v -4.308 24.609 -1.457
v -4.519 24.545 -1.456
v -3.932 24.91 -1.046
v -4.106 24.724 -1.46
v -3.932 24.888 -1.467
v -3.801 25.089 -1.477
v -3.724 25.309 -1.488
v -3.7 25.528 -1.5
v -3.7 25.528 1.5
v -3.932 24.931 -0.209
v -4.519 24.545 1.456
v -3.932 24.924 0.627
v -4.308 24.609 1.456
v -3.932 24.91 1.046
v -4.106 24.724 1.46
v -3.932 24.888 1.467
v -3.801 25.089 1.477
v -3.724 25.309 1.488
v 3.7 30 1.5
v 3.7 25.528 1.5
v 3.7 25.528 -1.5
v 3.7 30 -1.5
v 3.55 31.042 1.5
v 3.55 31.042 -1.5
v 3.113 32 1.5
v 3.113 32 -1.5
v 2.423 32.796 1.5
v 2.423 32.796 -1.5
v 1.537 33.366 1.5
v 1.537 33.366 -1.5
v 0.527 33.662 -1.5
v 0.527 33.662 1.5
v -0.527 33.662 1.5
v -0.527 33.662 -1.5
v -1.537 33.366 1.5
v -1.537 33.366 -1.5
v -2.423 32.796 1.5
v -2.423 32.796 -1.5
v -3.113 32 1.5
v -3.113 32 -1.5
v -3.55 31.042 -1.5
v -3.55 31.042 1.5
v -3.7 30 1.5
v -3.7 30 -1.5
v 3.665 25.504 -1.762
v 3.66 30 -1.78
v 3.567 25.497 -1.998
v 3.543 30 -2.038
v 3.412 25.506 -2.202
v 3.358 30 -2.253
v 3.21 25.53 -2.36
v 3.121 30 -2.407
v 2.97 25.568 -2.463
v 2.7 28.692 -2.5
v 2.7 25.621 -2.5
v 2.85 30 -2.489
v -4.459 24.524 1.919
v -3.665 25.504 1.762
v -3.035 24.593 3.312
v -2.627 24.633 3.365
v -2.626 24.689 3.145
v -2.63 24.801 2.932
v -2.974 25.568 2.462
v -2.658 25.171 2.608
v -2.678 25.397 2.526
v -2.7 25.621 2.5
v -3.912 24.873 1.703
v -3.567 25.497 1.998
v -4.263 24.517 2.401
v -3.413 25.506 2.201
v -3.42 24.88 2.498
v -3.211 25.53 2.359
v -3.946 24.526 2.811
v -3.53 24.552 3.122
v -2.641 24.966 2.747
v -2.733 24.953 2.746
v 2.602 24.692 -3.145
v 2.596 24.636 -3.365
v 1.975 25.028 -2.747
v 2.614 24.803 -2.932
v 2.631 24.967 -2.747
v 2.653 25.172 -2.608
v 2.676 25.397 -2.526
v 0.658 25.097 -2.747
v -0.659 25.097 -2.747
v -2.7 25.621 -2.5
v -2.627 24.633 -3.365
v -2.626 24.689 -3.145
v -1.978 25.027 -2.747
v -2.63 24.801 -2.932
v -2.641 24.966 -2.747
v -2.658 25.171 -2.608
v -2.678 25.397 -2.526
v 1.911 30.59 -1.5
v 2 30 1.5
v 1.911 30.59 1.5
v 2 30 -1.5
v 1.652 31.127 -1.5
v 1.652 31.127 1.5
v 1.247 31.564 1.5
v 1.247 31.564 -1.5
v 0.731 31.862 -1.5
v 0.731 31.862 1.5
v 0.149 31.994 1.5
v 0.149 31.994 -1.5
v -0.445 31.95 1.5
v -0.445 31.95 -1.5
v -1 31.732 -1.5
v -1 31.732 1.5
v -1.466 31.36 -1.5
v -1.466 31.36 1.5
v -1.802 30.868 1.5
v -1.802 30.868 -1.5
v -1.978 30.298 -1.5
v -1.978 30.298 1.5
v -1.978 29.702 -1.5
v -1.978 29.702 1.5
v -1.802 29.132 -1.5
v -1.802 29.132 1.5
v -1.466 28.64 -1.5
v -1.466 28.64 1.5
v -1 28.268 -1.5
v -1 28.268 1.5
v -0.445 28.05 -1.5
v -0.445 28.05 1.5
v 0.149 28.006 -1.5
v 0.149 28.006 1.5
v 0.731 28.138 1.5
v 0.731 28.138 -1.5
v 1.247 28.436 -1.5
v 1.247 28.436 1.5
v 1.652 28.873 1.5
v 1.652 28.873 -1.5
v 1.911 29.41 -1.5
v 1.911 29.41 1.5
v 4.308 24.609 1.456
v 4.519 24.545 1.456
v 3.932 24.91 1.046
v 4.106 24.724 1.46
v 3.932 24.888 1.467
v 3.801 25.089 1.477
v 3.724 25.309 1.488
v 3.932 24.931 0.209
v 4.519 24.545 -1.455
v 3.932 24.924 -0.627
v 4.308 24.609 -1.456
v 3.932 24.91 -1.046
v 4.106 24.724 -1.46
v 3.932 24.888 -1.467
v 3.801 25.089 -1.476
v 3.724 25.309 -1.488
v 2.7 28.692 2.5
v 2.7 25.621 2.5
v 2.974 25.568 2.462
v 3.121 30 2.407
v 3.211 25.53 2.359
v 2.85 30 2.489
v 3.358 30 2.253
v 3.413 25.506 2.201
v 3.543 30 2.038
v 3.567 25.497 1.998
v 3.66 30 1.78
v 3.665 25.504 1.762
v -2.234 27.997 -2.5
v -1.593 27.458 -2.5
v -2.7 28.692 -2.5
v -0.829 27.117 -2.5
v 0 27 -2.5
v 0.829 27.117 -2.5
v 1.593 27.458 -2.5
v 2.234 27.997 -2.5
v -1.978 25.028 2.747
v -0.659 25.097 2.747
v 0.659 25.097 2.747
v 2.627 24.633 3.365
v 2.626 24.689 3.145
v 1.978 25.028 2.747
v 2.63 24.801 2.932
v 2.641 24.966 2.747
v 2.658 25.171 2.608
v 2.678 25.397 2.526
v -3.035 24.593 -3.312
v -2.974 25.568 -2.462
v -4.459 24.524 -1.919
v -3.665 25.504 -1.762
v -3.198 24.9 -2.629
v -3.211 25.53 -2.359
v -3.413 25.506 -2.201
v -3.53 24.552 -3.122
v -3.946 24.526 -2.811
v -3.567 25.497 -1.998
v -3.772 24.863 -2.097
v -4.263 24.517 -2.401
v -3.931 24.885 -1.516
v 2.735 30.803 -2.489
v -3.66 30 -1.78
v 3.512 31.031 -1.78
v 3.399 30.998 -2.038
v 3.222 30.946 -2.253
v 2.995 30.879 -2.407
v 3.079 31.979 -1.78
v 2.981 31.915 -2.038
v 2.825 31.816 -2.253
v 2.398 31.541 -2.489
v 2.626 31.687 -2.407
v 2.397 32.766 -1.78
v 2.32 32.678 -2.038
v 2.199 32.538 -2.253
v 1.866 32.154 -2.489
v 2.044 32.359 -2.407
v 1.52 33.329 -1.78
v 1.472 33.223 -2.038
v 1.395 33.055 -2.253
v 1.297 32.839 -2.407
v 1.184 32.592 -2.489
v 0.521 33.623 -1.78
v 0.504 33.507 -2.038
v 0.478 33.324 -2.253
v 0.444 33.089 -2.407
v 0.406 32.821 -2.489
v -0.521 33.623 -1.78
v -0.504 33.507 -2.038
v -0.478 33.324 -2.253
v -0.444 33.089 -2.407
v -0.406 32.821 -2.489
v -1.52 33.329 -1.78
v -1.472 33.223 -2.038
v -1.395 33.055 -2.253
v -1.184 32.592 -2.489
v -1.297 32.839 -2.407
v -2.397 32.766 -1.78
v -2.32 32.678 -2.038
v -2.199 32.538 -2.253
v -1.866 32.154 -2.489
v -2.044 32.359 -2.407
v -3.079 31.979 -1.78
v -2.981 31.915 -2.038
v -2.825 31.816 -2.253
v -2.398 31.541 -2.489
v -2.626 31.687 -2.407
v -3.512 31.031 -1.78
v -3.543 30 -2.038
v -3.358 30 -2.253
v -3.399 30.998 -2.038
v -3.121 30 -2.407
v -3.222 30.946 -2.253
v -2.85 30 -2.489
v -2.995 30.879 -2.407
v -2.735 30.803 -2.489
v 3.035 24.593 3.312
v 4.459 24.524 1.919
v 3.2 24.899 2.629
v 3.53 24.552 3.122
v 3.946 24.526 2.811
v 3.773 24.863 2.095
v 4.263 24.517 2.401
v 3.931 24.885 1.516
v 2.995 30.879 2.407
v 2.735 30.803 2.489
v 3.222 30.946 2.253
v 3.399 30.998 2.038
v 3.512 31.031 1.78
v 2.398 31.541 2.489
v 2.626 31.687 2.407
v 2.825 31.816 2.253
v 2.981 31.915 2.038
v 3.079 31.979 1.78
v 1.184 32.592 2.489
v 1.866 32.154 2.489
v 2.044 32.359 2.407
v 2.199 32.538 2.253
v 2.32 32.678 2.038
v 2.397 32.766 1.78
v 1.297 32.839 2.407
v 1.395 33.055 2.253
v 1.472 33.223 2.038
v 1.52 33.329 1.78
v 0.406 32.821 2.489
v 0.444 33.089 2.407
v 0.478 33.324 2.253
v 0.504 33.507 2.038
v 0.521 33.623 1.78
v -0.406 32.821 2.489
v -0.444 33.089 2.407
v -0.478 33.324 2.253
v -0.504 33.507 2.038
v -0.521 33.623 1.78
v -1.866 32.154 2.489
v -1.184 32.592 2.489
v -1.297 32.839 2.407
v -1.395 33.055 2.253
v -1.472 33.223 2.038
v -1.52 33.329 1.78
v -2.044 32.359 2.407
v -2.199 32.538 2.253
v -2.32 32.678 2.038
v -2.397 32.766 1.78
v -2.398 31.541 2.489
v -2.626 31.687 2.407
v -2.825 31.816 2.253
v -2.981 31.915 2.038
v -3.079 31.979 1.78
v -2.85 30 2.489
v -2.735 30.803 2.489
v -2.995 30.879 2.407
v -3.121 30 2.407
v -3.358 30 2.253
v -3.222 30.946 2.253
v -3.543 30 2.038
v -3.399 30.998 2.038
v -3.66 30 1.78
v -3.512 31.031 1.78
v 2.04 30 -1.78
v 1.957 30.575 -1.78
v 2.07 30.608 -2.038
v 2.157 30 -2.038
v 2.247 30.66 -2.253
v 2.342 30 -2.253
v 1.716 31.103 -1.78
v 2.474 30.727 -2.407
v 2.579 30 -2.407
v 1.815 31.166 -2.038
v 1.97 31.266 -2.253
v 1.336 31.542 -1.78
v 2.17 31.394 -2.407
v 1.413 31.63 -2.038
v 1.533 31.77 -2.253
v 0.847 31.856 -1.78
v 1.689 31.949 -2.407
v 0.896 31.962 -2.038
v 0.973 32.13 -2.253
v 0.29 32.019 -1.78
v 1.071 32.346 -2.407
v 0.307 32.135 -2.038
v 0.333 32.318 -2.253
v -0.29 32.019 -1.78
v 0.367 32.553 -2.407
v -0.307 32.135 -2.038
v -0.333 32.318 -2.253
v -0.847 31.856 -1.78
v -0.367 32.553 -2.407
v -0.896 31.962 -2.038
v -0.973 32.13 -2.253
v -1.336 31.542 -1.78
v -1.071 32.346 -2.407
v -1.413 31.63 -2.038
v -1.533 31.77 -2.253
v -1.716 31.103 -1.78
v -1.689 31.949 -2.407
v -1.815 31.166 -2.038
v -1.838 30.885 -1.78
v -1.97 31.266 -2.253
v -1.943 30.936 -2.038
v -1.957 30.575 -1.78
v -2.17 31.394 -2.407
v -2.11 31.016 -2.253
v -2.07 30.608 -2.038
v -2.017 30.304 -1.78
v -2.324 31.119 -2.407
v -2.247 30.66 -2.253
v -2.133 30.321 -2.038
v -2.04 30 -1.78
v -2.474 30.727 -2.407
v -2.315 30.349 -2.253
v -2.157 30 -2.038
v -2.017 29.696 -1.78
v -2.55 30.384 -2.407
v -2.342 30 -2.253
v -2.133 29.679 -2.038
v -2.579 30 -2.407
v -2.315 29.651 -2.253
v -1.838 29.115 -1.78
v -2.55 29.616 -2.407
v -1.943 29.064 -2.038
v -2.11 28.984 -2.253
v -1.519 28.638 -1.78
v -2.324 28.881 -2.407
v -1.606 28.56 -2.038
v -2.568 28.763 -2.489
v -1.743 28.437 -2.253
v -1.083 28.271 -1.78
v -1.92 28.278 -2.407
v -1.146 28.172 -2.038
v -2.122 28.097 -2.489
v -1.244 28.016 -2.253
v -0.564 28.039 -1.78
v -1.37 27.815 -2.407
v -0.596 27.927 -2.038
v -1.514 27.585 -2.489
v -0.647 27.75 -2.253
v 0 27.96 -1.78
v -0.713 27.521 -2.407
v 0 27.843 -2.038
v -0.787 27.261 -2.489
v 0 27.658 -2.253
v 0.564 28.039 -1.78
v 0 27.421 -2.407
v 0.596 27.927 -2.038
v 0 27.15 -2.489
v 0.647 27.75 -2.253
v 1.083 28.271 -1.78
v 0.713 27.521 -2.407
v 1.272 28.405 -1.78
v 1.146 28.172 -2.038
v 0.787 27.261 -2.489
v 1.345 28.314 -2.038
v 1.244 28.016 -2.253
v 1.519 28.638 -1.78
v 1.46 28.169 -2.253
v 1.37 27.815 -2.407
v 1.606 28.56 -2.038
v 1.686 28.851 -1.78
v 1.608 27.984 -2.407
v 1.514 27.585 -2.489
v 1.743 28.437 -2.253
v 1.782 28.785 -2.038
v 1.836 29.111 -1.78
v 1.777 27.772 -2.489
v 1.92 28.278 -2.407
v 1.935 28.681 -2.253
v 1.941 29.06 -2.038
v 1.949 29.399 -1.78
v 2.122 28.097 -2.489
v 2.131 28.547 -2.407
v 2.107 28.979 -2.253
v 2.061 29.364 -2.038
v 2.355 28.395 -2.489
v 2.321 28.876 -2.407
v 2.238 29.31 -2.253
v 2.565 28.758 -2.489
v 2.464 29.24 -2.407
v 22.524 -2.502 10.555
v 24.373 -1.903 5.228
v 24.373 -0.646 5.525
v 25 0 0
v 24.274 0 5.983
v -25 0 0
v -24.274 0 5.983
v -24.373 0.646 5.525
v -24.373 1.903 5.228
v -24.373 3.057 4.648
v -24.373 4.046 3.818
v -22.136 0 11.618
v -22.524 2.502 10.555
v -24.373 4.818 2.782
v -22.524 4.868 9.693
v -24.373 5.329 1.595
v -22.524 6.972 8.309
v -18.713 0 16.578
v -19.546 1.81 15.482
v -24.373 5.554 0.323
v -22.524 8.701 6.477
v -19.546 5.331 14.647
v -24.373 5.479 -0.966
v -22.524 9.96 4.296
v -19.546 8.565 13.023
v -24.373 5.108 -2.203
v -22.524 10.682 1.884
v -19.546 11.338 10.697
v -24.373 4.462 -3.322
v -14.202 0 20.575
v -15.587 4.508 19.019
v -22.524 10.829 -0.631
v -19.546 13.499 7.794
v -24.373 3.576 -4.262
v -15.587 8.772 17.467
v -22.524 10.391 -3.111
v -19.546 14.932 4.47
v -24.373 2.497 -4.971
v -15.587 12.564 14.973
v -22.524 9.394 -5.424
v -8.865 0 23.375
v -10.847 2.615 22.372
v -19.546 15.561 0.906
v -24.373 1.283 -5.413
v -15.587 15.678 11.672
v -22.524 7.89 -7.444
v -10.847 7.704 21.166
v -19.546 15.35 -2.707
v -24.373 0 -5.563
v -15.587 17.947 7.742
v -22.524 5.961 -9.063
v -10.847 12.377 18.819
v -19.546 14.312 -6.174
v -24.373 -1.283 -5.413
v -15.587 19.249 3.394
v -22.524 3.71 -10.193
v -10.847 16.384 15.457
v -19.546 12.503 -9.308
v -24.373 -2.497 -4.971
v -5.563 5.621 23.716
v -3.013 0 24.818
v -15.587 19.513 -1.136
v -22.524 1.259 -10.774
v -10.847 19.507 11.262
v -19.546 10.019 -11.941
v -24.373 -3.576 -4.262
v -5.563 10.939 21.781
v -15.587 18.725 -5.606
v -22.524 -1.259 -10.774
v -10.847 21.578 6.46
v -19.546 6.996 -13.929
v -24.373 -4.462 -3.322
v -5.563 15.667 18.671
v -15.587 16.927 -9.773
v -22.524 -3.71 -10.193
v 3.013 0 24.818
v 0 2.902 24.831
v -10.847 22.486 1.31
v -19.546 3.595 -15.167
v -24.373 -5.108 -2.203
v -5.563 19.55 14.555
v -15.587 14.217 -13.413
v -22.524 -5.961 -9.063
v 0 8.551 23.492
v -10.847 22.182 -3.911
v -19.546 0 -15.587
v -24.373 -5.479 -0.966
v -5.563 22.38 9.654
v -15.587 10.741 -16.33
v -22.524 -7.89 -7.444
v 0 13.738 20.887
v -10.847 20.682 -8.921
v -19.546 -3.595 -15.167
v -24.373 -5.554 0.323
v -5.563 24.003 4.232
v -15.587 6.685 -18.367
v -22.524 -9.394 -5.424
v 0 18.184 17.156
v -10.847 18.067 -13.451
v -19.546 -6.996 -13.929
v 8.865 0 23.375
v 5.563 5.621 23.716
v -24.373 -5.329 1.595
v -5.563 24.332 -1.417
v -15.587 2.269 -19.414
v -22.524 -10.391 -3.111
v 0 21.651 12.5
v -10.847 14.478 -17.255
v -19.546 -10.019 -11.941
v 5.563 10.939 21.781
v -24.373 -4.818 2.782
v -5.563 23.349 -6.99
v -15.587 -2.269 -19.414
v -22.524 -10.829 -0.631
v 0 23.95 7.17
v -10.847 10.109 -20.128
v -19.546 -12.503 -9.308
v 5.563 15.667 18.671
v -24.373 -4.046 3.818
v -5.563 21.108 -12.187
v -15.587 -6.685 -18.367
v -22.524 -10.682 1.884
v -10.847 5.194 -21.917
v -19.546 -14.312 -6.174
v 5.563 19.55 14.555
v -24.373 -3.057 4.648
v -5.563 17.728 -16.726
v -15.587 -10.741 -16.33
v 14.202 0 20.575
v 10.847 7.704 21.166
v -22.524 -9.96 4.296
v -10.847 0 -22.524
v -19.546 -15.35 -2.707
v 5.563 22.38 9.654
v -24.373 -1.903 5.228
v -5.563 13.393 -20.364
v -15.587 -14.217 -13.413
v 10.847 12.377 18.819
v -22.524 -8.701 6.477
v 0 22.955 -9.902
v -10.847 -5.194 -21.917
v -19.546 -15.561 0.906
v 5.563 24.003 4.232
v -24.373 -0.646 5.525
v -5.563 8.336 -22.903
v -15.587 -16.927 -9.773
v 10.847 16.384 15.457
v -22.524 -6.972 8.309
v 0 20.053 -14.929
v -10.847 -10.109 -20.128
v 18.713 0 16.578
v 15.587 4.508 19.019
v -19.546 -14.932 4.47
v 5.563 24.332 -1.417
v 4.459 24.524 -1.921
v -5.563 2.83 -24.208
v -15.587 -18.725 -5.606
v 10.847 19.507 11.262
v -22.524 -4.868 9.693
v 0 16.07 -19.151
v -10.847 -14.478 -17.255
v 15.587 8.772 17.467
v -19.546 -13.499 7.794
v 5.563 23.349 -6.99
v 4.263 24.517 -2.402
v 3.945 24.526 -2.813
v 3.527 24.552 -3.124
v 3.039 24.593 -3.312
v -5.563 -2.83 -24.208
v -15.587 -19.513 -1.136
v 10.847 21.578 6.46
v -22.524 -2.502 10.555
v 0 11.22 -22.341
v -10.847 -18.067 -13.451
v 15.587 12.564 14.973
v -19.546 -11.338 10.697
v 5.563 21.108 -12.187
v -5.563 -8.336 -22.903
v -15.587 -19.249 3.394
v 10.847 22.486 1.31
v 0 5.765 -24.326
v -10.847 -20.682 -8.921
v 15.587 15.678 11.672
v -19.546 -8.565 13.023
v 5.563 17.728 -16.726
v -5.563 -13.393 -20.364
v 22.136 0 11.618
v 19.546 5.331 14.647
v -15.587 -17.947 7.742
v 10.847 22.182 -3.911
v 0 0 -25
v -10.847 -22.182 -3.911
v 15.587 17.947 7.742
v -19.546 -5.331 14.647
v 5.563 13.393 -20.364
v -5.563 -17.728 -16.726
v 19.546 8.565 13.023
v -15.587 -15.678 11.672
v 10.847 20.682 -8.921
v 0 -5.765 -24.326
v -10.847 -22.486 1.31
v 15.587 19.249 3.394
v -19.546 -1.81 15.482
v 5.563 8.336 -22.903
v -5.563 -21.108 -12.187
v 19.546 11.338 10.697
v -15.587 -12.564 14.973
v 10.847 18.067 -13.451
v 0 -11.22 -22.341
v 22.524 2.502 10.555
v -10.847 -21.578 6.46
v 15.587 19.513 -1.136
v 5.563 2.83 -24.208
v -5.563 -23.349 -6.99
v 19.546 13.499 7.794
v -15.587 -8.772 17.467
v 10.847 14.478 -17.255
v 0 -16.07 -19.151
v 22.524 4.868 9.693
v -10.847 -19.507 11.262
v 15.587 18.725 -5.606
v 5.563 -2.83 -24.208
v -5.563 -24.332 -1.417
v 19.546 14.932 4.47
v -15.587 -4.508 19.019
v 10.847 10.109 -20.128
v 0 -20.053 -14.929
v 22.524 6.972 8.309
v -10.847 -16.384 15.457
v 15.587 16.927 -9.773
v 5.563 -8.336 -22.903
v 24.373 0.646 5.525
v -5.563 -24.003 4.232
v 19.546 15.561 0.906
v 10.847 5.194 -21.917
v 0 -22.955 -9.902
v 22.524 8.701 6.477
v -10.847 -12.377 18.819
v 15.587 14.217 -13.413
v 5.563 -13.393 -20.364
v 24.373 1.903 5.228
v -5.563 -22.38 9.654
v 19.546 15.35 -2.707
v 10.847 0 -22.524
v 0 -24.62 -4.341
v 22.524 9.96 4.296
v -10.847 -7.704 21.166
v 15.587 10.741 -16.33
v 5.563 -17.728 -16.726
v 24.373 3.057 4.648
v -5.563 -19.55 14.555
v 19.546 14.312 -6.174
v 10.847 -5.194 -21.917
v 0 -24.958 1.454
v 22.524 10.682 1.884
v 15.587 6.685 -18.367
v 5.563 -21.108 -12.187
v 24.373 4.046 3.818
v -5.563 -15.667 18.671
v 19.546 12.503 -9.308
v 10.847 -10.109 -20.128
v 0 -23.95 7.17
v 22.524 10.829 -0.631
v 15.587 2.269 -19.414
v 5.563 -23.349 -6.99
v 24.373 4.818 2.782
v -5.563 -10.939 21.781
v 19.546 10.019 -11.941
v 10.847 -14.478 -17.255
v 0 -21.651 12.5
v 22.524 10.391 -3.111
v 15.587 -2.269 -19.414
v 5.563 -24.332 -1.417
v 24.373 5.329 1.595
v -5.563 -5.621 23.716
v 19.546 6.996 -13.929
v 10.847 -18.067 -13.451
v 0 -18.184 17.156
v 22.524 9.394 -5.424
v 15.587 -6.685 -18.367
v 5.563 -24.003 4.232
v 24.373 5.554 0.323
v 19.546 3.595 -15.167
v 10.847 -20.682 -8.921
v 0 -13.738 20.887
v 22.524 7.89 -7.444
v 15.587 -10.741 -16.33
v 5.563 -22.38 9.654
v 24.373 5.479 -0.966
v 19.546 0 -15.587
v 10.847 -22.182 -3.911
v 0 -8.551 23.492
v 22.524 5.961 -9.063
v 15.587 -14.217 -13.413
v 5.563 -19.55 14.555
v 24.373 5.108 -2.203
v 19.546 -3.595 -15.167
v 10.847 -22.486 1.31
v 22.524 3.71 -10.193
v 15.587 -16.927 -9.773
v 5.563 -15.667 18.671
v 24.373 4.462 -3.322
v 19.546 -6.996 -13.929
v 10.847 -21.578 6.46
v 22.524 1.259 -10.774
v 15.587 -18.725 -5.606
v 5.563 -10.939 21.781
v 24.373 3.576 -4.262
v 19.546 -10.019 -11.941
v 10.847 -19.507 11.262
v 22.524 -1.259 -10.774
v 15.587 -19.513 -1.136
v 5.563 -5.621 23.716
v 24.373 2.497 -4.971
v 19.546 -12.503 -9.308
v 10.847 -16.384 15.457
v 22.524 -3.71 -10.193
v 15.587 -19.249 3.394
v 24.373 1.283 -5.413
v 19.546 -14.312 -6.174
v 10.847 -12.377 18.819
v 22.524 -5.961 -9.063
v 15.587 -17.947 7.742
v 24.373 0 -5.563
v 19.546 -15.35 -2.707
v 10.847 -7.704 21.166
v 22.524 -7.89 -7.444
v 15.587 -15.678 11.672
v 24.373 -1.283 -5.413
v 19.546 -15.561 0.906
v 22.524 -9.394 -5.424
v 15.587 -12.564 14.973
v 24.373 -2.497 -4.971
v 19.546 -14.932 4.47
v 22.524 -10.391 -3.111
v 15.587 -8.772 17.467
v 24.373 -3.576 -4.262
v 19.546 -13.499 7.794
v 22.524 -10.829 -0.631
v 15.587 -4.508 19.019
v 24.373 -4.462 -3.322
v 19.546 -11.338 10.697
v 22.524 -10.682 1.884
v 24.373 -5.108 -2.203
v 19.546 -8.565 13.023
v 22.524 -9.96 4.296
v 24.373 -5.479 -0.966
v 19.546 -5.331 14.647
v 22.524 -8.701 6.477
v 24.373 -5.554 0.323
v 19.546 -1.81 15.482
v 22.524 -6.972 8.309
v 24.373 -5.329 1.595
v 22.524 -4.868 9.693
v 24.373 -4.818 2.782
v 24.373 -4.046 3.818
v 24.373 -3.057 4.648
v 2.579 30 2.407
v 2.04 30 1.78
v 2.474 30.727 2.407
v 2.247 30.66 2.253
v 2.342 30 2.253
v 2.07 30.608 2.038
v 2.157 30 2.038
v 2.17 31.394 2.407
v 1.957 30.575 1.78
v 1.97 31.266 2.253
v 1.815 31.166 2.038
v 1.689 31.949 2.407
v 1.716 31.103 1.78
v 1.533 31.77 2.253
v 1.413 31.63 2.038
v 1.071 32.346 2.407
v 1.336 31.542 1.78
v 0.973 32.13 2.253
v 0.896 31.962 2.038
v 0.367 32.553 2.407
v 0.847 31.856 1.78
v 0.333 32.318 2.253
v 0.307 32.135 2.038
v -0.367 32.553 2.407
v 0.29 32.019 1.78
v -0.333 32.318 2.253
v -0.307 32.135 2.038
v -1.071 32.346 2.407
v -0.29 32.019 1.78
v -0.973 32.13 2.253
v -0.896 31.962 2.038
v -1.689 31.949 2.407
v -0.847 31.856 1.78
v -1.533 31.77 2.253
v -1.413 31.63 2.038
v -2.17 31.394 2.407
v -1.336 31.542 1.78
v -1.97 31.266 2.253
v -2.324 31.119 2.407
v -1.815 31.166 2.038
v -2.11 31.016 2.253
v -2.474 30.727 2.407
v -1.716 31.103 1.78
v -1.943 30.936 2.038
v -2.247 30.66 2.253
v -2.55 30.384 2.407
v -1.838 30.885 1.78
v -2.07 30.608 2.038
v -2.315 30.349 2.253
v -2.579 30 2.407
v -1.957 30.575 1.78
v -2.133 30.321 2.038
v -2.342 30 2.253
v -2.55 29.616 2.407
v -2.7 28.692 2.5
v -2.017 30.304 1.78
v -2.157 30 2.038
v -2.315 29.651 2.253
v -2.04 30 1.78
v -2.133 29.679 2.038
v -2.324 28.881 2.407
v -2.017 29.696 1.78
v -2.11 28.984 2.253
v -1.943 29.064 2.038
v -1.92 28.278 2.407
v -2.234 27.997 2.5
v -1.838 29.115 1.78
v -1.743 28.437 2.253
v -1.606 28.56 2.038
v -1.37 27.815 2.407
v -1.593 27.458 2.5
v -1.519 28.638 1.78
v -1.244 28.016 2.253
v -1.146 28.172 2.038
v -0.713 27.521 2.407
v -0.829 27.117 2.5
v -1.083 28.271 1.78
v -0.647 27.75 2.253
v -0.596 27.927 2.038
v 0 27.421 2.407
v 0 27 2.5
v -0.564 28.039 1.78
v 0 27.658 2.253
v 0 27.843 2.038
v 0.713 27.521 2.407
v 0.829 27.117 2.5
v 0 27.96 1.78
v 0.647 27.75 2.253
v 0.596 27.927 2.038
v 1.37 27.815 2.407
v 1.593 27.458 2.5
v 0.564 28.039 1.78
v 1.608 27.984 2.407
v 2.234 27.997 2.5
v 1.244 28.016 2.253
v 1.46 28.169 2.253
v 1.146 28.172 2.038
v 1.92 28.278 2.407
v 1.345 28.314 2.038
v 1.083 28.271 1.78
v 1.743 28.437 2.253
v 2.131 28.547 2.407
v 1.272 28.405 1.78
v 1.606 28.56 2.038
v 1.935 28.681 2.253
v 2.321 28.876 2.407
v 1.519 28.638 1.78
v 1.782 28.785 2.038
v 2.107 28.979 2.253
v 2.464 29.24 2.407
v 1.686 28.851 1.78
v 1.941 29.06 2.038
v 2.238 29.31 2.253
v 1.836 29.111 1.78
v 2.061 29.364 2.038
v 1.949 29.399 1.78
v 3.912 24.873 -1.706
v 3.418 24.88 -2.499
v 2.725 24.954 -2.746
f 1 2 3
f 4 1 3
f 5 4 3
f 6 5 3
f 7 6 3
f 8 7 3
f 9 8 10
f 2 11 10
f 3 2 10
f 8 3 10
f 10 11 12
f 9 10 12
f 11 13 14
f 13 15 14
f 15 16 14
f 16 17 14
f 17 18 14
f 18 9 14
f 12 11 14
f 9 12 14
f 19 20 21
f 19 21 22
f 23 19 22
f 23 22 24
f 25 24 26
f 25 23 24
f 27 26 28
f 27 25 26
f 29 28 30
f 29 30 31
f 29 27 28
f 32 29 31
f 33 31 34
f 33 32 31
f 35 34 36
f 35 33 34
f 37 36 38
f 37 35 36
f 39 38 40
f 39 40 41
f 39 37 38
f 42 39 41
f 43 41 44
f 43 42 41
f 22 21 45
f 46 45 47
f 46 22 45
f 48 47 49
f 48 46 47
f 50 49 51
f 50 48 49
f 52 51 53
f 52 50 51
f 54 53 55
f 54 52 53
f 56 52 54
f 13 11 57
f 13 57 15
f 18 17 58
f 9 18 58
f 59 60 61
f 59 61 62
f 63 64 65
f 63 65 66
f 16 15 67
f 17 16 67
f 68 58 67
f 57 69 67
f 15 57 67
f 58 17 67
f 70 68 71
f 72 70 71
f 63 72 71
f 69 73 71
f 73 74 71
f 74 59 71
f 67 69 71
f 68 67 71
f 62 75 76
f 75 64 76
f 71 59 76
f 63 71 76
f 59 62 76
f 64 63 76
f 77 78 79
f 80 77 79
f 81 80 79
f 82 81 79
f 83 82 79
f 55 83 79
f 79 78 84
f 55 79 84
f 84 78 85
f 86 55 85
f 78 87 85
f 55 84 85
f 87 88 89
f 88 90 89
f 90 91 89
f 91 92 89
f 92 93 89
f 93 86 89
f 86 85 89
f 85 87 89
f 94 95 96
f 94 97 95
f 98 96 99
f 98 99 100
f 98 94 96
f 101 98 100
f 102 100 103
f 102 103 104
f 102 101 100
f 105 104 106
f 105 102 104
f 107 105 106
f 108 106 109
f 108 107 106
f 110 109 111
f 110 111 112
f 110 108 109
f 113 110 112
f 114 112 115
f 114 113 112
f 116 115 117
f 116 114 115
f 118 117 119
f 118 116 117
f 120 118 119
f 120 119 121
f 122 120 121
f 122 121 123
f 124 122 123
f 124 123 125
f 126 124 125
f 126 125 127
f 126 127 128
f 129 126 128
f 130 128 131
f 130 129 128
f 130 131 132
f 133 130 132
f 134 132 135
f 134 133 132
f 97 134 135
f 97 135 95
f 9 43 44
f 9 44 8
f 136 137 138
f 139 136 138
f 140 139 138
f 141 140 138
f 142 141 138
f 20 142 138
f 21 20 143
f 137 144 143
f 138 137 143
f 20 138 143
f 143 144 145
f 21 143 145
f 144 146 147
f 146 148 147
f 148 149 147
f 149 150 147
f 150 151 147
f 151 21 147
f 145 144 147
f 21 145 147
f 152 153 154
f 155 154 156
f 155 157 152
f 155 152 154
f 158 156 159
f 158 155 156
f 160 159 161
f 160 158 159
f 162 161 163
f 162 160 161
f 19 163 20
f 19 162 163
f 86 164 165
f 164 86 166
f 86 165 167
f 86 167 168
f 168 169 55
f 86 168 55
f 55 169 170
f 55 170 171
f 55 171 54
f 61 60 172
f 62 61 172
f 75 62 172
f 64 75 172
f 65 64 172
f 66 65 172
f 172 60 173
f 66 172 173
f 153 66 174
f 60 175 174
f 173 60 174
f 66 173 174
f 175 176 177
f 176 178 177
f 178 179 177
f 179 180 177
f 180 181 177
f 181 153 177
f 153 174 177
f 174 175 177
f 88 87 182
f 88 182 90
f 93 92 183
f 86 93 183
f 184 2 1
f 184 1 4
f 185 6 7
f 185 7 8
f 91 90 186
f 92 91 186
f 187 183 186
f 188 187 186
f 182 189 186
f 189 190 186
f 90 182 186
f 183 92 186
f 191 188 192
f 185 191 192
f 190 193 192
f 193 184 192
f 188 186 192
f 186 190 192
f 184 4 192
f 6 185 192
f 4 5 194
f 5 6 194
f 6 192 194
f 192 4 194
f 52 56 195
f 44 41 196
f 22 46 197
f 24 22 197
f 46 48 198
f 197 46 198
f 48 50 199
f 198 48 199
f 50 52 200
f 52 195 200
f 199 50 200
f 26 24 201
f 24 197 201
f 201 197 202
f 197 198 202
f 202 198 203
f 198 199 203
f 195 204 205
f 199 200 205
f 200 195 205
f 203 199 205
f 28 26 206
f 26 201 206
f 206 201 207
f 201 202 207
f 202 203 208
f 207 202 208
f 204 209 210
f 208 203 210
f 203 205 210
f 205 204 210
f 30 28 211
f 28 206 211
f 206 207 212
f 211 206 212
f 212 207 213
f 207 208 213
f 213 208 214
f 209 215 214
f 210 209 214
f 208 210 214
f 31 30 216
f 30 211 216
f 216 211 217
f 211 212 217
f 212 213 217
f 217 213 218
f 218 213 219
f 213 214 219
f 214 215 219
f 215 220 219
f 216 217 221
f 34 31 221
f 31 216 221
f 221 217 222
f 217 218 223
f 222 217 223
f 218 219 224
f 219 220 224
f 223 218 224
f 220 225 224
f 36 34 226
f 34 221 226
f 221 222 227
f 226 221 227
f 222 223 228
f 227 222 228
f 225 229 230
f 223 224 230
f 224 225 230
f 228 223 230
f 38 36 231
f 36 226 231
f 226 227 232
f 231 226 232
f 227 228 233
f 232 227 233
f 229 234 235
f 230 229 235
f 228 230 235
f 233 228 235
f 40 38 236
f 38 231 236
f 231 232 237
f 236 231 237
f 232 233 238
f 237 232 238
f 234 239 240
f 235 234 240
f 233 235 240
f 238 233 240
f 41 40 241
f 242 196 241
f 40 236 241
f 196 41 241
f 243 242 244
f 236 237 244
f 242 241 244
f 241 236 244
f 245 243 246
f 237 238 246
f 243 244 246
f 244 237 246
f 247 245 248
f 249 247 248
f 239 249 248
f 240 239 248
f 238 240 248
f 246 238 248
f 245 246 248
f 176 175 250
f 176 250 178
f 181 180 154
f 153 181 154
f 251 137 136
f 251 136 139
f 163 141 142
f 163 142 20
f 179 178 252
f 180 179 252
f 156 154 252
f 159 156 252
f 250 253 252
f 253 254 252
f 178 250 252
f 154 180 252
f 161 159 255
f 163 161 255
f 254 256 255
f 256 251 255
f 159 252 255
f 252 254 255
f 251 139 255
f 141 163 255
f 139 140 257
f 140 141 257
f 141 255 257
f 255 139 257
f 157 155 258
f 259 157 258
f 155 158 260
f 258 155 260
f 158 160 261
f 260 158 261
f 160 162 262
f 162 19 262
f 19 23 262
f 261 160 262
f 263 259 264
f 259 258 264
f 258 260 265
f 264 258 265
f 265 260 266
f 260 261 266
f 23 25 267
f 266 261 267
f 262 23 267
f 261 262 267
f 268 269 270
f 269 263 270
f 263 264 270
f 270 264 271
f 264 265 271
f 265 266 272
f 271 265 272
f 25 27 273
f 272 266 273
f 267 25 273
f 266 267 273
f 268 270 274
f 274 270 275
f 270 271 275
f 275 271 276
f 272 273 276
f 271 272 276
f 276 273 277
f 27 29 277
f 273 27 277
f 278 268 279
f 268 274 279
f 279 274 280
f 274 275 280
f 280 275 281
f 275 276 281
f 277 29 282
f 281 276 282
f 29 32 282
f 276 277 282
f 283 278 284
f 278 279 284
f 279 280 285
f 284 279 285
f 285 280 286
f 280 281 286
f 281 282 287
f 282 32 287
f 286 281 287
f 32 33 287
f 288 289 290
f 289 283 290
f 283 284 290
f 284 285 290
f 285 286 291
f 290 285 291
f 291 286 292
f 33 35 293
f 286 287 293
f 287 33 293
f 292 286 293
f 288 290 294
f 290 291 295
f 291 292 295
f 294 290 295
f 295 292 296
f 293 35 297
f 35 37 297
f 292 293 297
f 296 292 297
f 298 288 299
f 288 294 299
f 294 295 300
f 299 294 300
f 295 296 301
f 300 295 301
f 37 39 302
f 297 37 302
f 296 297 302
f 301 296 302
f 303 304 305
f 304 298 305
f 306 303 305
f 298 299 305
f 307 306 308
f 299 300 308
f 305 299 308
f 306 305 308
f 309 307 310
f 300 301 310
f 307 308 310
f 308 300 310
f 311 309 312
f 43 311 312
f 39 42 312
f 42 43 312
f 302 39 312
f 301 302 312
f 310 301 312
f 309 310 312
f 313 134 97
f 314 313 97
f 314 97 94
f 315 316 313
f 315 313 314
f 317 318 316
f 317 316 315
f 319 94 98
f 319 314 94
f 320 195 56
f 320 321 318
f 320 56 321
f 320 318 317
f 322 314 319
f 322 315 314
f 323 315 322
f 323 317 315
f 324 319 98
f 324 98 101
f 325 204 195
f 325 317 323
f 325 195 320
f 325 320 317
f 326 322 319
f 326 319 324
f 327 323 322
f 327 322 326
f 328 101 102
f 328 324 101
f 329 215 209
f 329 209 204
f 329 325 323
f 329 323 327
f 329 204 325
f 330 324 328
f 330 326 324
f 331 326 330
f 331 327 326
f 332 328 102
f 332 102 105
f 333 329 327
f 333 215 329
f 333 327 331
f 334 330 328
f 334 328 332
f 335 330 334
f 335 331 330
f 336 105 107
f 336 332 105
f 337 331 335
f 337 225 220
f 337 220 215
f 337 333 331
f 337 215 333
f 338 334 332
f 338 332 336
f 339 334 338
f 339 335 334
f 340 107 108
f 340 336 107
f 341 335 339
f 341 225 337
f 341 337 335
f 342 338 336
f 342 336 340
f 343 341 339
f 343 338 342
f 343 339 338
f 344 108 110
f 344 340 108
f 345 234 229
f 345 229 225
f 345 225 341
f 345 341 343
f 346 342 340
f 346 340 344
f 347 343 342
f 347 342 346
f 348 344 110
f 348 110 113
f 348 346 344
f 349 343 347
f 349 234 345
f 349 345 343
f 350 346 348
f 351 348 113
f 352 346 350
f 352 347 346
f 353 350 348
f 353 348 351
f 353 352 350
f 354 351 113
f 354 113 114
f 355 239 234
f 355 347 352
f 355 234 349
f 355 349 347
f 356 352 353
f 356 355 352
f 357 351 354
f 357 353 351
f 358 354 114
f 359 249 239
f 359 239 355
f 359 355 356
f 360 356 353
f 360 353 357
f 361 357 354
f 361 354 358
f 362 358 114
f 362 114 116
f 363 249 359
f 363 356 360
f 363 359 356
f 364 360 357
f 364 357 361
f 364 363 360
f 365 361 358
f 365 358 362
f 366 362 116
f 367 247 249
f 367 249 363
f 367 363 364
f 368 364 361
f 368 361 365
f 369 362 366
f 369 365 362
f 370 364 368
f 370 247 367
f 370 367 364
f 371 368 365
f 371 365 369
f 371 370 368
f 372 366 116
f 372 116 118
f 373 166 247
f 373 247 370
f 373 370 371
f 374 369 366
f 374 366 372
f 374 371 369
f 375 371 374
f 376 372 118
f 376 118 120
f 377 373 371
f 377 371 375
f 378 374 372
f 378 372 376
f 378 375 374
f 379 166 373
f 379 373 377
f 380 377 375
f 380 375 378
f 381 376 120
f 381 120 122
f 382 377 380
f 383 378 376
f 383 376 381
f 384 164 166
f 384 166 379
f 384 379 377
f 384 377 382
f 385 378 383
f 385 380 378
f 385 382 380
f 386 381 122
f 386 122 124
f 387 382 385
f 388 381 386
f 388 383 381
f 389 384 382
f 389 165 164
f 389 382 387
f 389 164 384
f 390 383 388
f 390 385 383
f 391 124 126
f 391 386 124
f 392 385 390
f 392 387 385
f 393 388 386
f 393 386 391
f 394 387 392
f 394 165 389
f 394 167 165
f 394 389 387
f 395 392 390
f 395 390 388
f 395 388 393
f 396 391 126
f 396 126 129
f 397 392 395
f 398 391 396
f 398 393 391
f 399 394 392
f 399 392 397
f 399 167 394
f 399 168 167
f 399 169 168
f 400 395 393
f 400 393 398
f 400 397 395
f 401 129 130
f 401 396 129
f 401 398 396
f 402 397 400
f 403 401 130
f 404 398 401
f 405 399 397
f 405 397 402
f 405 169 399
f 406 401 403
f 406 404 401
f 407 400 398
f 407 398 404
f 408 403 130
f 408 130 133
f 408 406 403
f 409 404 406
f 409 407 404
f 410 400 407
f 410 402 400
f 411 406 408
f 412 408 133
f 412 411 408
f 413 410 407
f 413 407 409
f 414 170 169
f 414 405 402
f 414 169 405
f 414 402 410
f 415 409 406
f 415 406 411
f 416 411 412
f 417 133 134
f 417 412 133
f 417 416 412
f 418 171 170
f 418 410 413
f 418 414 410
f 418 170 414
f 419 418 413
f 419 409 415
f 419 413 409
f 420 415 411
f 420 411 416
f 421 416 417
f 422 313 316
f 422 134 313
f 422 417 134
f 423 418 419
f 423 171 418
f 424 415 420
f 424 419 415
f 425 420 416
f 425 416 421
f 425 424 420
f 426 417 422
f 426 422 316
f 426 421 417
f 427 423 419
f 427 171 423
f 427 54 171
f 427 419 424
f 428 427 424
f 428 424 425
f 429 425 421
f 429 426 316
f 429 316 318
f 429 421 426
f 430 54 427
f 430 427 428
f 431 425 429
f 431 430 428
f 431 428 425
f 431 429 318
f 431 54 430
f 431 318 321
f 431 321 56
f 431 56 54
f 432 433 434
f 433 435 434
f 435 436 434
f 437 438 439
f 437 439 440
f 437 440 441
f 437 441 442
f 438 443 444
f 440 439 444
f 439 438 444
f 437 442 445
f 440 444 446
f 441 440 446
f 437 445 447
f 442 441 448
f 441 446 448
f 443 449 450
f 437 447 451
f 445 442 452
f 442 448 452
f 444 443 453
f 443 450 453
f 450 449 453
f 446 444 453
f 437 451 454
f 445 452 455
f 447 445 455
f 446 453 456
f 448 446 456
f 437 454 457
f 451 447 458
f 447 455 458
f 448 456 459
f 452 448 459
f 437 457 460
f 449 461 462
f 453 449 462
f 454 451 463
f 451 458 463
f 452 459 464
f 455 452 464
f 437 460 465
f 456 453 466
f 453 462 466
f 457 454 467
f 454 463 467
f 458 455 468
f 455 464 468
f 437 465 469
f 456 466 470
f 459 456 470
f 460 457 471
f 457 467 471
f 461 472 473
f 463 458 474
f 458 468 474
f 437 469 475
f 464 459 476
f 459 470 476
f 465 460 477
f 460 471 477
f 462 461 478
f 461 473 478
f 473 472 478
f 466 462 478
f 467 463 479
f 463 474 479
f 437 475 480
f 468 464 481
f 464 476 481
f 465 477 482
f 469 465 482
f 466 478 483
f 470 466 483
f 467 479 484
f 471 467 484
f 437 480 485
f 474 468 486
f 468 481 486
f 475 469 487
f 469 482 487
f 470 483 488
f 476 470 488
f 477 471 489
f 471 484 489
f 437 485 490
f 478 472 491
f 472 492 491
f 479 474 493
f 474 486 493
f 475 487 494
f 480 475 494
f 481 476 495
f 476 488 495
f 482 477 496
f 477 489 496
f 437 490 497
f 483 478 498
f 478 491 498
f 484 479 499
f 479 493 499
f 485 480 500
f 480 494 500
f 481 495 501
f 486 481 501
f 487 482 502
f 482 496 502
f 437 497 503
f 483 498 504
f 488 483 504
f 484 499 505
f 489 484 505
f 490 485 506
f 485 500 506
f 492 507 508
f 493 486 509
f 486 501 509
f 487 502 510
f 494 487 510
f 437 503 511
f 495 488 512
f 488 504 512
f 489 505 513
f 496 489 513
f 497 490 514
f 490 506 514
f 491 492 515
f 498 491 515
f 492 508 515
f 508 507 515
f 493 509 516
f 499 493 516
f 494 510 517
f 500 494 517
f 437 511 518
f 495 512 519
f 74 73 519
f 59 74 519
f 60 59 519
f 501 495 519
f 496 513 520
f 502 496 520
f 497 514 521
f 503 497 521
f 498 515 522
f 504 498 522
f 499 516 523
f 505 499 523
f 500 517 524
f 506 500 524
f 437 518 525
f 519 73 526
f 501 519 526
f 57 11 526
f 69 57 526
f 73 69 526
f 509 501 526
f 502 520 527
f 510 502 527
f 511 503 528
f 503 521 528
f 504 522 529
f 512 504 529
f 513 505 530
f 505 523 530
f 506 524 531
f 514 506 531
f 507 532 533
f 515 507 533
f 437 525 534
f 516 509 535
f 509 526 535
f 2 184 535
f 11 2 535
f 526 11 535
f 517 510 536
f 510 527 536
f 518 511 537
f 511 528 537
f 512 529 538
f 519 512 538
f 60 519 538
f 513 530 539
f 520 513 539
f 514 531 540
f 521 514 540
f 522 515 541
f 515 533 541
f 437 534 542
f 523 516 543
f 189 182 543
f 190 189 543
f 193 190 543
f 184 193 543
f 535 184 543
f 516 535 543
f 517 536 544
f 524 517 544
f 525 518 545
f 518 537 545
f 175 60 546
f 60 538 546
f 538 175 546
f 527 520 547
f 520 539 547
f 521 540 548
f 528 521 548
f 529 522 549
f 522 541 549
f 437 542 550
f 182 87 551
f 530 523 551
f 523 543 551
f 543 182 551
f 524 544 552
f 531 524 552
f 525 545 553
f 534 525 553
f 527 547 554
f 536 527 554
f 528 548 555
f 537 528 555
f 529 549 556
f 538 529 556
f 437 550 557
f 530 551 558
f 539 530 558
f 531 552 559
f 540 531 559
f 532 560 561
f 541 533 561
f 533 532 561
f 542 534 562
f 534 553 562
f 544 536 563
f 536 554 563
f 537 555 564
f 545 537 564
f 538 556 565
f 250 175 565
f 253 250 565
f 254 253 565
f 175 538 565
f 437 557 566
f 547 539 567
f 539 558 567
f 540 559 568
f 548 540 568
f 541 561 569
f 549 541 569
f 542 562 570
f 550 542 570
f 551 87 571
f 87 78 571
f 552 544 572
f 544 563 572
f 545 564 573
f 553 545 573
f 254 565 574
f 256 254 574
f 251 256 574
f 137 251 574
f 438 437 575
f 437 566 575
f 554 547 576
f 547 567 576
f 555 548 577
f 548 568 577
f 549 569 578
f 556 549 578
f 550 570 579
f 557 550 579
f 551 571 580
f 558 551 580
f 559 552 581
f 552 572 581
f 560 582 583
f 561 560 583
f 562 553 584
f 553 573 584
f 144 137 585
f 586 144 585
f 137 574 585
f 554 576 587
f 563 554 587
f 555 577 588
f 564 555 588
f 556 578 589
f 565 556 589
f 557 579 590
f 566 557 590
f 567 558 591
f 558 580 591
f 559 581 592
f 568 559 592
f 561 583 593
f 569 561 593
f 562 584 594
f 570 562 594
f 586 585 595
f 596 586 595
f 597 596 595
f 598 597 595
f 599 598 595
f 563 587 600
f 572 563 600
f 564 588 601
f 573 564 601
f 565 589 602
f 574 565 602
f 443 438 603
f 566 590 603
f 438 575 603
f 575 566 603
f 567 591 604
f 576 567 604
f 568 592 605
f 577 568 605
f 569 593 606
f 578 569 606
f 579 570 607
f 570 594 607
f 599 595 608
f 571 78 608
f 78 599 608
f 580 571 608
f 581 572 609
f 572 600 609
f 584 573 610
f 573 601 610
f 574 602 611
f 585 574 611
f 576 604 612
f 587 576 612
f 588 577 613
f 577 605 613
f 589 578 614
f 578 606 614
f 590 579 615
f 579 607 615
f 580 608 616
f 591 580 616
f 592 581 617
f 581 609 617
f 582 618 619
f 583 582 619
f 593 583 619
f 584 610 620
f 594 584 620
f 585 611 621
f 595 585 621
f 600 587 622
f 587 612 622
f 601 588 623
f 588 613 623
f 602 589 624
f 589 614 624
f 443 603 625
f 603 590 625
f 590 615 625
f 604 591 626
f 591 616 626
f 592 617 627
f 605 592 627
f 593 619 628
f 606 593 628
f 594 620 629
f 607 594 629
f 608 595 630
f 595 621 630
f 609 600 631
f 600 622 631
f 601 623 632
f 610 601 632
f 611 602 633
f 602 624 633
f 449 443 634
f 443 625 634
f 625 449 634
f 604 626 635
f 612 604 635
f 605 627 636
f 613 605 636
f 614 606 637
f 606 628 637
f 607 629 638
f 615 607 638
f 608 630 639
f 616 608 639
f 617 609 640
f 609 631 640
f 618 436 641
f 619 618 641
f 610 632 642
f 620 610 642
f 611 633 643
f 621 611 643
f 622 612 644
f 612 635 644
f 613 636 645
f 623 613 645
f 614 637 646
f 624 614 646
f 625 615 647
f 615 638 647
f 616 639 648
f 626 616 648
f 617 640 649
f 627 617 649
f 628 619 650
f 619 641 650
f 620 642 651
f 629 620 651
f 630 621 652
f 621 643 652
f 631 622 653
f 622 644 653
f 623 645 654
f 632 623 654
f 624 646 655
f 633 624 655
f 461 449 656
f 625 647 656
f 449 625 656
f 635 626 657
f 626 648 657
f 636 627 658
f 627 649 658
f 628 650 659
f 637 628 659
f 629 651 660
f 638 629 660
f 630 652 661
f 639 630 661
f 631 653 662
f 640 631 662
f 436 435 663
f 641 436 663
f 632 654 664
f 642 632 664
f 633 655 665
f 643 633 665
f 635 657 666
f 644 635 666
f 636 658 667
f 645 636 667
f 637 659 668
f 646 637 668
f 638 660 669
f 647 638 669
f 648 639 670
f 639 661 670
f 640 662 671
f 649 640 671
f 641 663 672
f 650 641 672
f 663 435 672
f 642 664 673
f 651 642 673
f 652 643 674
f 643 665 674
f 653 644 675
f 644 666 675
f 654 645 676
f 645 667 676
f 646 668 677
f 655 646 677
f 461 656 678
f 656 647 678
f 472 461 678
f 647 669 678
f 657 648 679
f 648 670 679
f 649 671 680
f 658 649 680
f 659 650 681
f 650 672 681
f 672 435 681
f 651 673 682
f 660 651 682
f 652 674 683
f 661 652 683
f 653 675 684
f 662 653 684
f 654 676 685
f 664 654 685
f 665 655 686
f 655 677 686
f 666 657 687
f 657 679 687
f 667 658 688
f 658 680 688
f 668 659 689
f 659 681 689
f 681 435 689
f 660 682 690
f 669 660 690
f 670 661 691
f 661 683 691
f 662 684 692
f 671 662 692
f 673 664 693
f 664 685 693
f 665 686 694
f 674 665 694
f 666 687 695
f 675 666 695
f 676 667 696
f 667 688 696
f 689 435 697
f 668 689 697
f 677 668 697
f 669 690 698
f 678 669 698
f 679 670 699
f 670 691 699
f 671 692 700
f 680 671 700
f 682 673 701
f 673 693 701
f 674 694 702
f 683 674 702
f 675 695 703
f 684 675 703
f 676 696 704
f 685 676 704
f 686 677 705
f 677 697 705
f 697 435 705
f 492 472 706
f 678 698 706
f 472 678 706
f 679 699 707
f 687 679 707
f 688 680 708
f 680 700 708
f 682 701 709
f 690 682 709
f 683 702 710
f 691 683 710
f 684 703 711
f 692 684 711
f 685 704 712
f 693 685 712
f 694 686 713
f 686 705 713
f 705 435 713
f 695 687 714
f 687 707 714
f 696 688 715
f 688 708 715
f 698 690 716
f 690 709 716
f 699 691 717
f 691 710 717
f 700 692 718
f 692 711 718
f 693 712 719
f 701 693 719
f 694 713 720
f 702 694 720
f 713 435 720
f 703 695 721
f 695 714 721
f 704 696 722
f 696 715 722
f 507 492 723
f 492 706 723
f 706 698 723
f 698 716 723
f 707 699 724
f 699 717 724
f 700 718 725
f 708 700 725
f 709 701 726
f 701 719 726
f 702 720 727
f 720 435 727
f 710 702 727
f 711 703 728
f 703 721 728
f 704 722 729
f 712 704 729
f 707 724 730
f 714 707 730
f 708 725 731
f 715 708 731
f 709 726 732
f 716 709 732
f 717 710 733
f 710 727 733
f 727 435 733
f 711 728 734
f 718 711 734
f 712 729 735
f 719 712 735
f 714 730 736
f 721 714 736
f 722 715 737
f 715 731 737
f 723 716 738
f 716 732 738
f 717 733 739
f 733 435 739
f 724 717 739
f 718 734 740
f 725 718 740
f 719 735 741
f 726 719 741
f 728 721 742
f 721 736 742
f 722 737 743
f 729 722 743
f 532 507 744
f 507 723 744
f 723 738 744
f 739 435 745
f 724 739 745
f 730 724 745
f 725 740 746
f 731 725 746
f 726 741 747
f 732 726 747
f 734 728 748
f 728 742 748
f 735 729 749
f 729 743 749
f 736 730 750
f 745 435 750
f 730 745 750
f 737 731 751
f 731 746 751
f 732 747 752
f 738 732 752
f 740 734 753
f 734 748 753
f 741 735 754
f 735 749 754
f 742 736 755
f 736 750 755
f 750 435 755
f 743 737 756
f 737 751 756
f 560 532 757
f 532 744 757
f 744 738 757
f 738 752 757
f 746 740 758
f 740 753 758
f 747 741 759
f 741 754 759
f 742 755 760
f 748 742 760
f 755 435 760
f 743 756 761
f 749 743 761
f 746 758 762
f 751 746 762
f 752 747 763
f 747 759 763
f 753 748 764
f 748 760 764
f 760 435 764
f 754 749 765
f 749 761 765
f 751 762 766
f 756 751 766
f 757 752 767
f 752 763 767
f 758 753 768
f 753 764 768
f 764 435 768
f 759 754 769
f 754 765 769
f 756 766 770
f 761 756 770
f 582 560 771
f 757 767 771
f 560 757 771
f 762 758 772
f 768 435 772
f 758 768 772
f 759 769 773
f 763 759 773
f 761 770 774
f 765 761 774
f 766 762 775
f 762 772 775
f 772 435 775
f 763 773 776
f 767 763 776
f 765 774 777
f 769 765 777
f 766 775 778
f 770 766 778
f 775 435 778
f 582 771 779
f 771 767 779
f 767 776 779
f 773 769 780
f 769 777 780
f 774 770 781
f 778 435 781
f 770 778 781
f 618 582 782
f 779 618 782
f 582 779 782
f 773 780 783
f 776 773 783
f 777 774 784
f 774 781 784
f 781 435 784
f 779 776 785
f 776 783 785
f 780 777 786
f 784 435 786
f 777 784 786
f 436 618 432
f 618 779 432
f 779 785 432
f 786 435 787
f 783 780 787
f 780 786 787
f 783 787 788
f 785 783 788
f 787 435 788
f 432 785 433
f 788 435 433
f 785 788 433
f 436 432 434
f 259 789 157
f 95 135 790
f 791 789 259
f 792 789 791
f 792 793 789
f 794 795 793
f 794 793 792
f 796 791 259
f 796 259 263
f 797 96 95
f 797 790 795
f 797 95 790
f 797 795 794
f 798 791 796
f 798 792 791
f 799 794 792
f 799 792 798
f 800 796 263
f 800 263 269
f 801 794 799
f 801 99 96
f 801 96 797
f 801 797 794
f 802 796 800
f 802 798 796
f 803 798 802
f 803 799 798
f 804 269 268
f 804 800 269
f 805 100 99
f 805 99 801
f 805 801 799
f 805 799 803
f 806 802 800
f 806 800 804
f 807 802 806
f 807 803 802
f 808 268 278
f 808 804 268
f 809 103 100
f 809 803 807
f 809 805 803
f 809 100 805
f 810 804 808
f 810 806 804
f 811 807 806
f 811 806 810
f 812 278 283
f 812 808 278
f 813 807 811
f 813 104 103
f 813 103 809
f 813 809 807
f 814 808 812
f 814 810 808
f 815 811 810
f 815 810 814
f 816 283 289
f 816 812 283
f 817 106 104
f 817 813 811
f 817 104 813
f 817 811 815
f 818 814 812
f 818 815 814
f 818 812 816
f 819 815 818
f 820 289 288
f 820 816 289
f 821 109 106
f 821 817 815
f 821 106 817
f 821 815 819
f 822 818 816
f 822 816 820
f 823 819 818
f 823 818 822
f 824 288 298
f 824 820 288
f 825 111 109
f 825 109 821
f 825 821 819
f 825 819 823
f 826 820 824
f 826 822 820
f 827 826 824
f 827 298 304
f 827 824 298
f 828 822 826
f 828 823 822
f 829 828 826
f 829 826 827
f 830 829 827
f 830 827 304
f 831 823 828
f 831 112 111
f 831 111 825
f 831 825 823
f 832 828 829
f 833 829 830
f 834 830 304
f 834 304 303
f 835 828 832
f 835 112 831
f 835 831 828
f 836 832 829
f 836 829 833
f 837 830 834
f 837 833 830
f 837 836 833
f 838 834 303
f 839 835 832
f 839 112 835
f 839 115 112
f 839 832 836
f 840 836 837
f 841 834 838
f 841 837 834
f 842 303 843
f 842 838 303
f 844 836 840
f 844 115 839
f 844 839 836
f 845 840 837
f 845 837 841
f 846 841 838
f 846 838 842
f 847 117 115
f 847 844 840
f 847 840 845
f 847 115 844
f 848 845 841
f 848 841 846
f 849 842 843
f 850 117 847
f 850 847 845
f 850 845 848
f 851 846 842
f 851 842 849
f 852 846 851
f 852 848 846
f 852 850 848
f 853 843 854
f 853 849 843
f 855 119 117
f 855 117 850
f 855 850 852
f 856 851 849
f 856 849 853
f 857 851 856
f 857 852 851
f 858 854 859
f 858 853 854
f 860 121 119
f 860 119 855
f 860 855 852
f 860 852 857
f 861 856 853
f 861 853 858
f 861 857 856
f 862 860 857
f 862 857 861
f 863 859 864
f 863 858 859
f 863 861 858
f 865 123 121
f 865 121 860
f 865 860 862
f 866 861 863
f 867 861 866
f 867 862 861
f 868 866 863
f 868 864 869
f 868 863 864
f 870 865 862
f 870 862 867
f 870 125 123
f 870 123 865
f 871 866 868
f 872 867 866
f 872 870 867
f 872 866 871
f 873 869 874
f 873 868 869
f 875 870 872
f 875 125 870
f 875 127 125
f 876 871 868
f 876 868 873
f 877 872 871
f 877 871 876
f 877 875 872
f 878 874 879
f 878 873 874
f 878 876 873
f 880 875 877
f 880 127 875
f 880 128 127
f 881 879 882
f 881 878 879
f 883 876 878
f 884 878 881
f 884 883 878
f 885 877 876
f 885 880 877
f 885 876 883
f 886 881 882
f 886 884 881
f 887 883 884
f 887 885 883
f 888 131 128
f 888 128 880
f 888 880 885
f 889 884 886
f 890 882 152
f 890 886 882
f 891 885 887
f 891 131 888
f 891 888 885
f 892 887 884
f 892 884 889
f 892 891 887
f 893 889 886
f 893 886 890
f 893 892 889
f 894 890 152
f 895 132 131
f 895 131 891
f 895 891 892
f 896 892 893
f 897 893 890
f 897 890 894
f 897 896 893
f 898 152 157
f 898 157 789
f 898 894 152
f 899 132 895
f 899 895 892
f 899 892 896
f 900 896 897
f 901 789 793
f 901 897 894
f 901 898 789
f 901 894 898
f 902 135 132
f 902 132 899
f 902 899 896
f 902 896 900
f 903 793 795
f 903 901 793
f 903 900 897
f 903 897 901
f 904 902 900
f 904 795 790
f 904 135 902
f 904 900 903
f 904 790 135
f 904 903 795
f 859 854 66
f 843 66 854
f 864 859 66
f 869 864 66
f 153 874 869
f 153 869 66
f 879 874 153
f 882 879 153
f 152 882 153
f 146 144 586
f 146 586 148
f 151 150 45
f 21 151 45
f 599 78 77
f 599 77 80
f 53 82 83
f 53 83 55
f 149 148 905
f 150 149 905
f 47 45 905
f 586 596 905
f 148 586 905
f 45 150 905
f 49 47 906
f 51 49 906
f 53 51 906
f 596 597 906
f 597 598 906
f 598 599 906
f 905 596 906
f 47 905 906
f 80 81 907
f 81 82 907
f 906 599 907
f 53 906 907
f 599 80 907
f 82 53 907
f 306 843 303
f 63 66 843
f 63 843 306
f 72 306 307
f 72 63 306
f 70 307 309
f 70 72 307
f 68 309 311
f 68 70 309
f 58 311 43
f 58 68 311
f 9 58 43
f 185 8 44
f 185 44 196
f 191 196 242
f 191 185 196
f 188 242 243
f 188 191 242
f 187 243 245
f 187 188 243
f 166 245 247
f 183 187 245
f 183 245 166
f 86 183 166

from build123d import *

# Parameters (mm, degrees)
SKETCH2_R           = 2
BOSS_EXTRUDE1_DEPTH = 2.5
FILLET1_R           = 1


with BuildPart() as part:
    # Sketch1 → Revolve1 (revolve)
    with BuildSketch(Plane(origin=(0, 0, 0), x_dir=(1, 0, 0), z_dir=(0, 1, 0))):
        with BuildLine():
            Line((25, 0), (-25, 0))
            ThreePointArc((-25, 0), (0, -25), (25, 0))
        make_face()
    revolve(axis=Axis((25, 0, 0), (-1, 0, 0)))

    # Sketch2 → Boss-Extrude1 (add, symmetric)
    with BuildSketch(Plane.XY):
        with BuildLine():
            Line((-3.7, 30), (-3.7, 20))
            Line((-3.7, 20), (3.7, 20))
            Line((3.7, 20), (3.7, 30))
            ThreePointArc((3.7, 30), (0, 33.7), (-3.7, 30))
        make_face()
        with Locations((0, 30)):
            Circle(SKETCH2_R, mode=Mode.SUBTRACT)
    extrude(amount=BOSS_EXTRUDE1_DEPTH, both=True)

    # Fillet1
    fillet1_edges = [part.edges().sort_by_distance(p)[0] for p in [
        (0, 33.7, -2.5),
        (3.7, 27.298983698, -2.5),
        (-3.7, 27.298983698, -2.5),
    ]]
    fillet(fillet1_edges, radius=FILLET1_R)
    fillet1_2_edges = [part.edges().sort_by_distance(p)[0] for p in [
        (3.7, 27.298983698, 2.5),
        (0, 33.7, 2.5),
        (-3.7, 27.298983698, 2.5),
    ]]
    fillet(fillet1_2_edges, radius=FILLET1_R)
    fillet1_3_edges = [part.edges().sort_by_distance(p)[0] for p in [
        (0, 24.874685928, -2.5),
    ]]
    fillet(fillet1_3_edges, radius=FILLET1_R)
    # the kernel refuses this fillet: 1 mm, written as the material it takes off along each edge
    with BuildSketch(Plane(origin=(0, 30, -2.5), x_dir=(1, 0, 0), z_dir=(0, -1, 0))) as fillet1_4_piece_1:
        with BuildLine():
            CenterArc((2 + FILLET1_R, FILLET1_R), FILLET1_R, 180, 90)
            Line((2, FILLET1_R), (2 - FILLET1_R * 0.02, FILLET1_R))
            Line((2 - FILLET1_R * 0.02, FILLET1_R), (2 - FILLET1_R * 0.02, -FILLET1_R * 0.02))
            Line((2 - FILLET1_R * 0.02, -FILLET1_R * 0.02), (2 + FILLET1_R, -FILLET1_R * 0.02))
            Line((2 + FILLET1_R, -FILLET1_R * 0.02), (2 + FILLET1_R, 0))
        make_face()
    revolve(axis=Axis((0, 30, -2.5), (0, 0, 1)), mode=Mode.SUBTRACT)
    # the kernel refuses this fillet: 1 mm, written as the material it takes off along each edge
    with BuildSketch(Plane(origin=(0, 30, 2.5), x_dir=(1, 0, 0), z_dir=(0, -1, 0))) as fillet1_5_piece_1:
        with BuildLine():
            CenterArc((2 + FILLET1_R, -FILLET1_R), FILLET1_R, 90, 90)
            Line((2, -FILLET1_R), (2 - FILLET1_R * 0.02, -FILLET1_R))
            Line((2 - FILLET1_R * 0.02, -FILLET1_R), (2 - FILLET1_R * 0.02, FILLET1_R * 0.02))
            Line((2 - FILLET1_R * 0.02, FILLET1_R * 0.02), (2 + FILLET1_R, FILLET1_R * 0.02))
            Line((2 + FILLET1_R, FILLET1_R * 0.02), (2 + FILLET1_R, 0))
        make_face()
    revolve(axis=Axis((0, 30, 2.5), (0, 0, 1)), mode=Mode.SUBTRACT)


solid = part.part
